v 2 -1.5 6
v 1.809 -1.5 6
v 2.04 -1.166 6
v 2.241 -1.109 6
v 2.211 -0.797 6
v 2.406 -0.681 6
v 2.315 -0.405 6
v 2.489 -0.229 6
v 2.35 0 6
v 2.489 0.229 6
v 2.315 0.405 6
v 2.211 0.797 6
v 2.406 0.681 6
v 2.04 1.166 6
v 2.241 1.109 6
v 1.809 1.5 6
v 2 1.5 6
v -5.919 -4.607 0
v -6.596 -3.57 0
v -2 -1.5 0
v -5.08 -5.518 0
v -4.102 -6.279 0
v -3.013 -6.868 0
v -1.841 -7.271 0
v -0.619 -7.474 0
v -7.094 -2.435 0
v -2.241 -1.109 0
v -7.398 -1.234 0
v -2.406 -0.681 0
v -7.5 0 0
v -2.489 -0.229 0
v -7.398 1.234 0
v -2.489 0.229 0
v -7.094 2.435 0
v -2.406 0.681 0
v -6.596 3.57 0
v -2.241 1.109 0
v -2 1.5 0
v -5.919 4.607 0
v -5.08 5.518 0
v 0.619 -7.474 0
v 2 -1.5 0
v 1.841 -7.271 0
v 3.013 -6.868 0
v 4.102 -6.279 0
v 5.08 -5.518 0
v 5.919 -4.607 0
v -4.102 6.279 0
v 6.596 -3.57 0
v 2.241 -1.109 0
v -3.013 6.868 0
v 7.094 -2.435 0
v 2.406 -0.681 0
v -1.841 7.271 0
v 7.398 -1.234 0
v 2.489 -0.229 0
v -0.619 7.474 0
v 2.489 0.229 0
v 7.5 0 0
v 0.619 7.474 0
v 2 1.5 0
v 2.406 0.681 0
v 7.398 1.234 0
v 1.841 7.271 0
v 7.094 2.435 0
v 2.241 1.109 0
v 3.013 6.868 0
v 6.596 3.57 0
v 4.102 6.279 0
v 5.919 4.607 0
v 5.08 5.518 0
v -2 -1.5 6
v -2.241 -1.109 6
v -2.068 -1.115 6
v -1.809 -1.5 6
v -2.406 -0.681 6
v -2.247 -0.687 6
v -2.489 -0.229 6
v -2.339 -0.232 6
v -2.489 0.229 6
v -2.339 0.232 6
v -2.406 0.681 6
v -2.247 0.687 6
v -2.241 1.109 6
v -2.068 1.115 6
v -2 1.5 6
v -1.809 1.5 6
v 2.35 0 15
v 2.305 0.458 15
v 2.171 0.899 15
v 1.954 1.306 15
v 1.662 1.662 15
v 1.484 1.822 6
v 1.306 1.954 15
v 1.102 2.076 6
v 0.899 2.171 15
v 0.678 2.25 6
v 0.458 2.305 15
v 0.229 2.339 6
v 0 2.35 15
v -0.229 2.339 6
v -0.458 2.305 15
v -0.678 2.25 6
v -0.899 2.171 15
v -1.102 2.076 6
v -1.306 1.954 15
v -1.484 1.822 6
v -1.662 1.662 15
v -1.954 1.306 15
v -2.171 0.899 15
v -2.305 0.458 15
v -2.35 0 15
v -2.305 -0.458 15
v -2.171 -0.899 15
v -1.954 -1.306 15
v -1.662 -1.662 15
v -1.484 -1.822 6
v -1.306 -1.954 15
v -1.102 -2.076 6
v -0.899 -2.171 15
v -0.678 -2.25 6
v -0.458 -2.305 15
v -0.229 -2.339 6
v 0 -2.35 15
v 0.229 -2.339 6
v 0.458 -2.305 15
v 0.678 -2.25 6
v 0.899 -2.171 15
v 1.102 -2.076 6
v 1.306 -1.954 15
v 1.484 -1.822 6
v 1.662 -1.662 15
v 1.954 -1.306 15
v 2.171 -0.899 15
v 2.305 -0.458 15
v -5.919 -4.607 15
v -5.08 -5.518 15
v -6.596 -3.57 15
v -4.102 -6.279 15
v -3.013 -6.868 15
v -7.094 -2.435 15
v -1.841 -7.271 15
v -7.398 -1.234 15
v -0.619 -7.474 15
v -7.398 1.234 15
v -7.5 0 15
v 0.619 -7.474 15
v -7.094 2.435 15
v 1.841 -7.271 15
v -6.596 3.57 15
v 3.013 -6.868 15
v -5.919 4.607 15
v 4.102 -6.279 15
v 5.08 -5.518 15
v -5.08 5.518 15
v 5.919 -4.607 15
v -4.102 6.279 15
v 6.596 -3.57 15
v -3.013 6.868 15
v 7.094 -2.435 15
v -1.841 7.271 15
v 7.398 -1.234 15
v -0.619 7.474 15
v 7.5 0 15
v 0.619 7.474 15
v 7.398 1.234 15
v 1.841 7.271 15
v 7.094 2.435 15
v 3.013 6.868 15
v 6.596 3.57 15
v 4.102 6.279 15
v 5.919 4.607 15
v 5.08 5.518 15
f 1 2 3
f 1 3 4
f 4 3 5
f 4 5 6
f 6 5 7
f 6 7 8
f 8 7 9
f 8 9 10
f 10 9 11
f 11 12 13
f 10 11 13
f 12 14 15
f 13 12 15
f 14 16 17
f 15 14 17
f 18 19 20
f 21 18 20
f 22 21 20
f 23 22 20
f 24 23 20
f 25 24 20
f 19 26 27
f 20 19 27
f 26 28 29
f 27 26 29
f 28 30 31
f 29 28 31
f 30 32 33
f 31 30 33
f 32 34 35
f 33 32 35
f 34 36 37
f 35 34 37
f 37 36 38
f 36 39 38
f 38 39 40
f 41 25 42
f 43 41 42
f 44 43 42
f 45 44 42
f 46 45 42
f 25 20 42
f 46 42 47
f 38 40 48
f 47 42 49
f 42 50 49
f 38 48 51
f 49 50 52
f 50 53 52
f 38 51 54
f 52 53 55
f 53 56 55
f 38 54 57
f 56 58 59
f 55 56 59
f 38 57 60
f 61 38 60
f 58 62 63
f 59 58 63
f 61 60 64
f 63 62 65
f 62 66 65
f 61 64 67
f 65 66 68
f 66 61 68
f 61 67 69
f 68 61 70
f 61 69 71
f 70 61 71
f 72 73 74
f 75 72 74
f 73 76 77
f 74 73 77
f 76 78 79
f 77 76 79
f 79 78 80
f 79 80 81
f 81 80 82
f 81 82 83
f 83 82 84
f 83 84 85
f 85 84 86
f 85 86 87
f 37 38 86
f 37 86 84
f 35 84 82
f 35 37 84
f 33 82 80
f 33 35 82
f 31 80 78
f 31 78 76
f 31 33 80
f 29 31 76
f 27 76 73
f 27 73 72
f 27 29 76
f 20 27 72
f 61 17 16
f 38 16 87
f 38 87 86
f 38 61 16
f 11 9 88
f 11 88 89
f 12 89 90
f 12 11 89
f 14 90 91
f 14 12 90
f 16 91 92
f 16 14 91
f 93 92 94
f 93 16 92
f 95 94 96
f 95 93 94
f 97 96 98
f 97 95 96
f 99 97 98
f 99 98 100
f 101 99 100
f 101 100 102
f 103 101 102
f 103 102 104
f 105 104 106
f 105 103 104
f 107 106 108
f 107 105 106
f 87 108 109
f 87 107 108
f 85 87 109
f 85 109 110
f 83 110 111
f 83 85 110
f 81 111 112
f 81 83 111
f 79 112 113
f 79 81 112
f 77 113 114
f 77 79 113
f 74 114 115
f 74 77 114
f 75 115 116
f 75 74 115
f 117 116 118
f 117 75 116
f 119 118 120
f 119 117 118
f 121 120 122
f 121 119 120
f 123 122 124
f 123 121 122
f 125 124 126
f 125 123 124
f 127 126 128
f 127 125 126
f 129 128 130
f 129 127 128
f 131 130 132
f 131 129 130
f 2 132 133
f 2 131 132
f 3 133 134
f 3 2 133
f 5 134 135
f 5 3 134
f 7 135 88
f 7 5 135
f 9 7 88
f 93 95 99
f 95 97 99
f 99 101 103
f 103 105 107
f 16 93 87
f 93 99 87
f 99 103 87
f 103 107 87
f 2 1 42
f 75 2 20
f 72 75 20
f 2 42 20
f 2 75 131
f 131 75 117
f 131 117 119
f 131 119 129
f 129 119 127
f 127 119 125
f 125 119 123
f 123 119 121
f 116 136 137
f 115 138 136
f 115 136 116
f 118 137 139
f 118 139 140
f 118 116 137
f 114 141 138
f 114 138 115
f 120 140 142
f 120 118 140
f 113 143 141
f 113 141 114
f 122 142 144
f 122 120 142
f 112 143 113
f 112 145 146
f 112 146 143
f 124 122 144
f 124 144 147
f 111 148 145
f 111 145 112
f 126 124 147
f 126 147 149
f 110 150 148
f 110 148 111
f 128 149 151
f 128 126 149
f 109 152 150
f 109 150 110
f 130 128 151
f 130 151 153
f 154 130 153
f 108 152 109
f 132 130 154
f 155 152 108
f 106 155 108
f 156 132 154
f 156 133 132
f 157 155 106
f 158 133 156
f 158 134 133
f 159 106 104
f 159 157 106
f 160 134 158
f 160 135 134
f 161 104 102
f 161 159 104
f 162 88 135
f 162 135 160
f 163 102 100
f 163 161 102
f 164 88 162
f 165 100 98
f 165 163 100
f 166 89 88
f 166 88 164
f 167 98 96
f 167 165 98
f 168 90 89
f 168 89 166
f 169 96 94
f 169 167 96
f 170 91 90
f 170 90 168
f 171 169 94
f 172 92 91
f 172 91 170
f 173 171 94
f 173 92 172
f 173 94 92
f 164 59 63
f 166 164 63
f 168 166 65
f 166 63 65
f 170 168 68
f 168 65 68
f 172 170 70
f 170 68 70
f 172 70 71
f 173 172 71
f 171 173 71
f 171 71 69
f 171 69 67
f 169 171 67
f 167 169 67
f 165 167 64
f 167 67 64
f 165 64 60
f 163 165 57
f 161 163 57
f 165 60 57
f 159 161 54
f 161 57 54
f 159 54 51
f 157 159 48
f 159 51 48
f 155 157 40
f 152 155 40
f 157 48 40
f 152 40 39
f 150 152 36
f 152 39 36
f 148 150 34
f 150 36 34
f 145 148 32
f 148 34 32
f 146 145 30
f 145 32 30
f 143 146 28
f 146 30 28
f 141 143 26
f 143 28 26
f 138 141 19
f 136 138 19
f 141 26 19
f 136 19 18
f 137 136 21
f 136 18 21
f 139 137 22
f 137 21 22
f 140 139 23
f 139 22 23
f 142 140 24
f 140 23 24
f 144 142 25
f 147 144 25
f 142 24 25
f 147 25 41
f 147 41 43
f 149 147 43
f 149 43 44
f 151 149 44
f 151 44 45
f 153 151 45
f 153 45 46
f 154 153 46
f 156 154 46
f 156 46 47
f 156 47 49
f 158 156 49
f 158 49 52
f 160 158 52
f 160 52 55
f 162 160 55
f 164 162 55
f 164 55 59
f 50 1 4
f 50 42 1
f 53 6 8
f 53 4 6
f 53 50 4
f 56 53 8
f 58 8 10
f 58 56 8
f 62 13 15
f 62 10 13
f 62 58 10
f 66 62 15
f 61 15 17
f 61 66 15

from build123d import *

# Parameters (mm, degrees)
SCHIZZO1_R                   = 7.5
SCHIZZO1_R_2                 = 2.5
ESTRUSIONE_ESTRUSIONE1_DEPTH = 15
ESTRUSIONE_ESTRUSIONE2_DEPTH = 6
ESTRUSIONE_ESTRUSIONE3_START = -9
SCHIZZO3_R                   = 2.5
SCHIZZO3_R_2                 = 2.35
ESTRUSIONE_ESTRUSIONE3_DEPTH = 9


with BuildPart() as part:
    # Schizzo1 → Estrusione-Estrusione1 (new body)
    with BuildSketch(Plane.XY):
        Circle(SCHIZZO1_R)
        Circle(SCHIZZO1_R_2, mode=Mode.SUBTRACT)
    extrude(amount=ESTRUSIONE_ESTRUSIONE1_DEPTH)

    # Schizzo2 → Estrusione-Estrusione2 (add)
    with BuildSketch(Plane(origin=(0, 0, 0), x_dir=(-1, 0, 0), z_dir=(0, 0, -1))):
        with BuildLine():
            Line((-2, -1.5), (2, -1.5))
            ThreePointArc((2, -1.5), (0, -2.5), (-2, -1.5))
        make_face()
        with BuildLine():
            Line((-2, 1.5), (2, 1.5))
            ThreePointArc((2, 1.5), (0, 2.5), (-2, 1.5))
        make_face()
    extrude(amount=-ESTRUSIONE_ESTRUSIONE2_DEPTH)

    # Schizzo3 → Estrusione-Estrusione3 (add)
    with BuildSketch(Plane.XY.offset(15).offset(ESTRUSIONE_ESTRUSIONE3_START)):
        Circle(SCHIZZO3_R)
        Circle(SCHIZZO3_R_2, mode=Mode.SUBTRACT)
    extrude(amount=ESTRUSIONE_ESTRUSIONE3_DEPTH)


solid = part.part
